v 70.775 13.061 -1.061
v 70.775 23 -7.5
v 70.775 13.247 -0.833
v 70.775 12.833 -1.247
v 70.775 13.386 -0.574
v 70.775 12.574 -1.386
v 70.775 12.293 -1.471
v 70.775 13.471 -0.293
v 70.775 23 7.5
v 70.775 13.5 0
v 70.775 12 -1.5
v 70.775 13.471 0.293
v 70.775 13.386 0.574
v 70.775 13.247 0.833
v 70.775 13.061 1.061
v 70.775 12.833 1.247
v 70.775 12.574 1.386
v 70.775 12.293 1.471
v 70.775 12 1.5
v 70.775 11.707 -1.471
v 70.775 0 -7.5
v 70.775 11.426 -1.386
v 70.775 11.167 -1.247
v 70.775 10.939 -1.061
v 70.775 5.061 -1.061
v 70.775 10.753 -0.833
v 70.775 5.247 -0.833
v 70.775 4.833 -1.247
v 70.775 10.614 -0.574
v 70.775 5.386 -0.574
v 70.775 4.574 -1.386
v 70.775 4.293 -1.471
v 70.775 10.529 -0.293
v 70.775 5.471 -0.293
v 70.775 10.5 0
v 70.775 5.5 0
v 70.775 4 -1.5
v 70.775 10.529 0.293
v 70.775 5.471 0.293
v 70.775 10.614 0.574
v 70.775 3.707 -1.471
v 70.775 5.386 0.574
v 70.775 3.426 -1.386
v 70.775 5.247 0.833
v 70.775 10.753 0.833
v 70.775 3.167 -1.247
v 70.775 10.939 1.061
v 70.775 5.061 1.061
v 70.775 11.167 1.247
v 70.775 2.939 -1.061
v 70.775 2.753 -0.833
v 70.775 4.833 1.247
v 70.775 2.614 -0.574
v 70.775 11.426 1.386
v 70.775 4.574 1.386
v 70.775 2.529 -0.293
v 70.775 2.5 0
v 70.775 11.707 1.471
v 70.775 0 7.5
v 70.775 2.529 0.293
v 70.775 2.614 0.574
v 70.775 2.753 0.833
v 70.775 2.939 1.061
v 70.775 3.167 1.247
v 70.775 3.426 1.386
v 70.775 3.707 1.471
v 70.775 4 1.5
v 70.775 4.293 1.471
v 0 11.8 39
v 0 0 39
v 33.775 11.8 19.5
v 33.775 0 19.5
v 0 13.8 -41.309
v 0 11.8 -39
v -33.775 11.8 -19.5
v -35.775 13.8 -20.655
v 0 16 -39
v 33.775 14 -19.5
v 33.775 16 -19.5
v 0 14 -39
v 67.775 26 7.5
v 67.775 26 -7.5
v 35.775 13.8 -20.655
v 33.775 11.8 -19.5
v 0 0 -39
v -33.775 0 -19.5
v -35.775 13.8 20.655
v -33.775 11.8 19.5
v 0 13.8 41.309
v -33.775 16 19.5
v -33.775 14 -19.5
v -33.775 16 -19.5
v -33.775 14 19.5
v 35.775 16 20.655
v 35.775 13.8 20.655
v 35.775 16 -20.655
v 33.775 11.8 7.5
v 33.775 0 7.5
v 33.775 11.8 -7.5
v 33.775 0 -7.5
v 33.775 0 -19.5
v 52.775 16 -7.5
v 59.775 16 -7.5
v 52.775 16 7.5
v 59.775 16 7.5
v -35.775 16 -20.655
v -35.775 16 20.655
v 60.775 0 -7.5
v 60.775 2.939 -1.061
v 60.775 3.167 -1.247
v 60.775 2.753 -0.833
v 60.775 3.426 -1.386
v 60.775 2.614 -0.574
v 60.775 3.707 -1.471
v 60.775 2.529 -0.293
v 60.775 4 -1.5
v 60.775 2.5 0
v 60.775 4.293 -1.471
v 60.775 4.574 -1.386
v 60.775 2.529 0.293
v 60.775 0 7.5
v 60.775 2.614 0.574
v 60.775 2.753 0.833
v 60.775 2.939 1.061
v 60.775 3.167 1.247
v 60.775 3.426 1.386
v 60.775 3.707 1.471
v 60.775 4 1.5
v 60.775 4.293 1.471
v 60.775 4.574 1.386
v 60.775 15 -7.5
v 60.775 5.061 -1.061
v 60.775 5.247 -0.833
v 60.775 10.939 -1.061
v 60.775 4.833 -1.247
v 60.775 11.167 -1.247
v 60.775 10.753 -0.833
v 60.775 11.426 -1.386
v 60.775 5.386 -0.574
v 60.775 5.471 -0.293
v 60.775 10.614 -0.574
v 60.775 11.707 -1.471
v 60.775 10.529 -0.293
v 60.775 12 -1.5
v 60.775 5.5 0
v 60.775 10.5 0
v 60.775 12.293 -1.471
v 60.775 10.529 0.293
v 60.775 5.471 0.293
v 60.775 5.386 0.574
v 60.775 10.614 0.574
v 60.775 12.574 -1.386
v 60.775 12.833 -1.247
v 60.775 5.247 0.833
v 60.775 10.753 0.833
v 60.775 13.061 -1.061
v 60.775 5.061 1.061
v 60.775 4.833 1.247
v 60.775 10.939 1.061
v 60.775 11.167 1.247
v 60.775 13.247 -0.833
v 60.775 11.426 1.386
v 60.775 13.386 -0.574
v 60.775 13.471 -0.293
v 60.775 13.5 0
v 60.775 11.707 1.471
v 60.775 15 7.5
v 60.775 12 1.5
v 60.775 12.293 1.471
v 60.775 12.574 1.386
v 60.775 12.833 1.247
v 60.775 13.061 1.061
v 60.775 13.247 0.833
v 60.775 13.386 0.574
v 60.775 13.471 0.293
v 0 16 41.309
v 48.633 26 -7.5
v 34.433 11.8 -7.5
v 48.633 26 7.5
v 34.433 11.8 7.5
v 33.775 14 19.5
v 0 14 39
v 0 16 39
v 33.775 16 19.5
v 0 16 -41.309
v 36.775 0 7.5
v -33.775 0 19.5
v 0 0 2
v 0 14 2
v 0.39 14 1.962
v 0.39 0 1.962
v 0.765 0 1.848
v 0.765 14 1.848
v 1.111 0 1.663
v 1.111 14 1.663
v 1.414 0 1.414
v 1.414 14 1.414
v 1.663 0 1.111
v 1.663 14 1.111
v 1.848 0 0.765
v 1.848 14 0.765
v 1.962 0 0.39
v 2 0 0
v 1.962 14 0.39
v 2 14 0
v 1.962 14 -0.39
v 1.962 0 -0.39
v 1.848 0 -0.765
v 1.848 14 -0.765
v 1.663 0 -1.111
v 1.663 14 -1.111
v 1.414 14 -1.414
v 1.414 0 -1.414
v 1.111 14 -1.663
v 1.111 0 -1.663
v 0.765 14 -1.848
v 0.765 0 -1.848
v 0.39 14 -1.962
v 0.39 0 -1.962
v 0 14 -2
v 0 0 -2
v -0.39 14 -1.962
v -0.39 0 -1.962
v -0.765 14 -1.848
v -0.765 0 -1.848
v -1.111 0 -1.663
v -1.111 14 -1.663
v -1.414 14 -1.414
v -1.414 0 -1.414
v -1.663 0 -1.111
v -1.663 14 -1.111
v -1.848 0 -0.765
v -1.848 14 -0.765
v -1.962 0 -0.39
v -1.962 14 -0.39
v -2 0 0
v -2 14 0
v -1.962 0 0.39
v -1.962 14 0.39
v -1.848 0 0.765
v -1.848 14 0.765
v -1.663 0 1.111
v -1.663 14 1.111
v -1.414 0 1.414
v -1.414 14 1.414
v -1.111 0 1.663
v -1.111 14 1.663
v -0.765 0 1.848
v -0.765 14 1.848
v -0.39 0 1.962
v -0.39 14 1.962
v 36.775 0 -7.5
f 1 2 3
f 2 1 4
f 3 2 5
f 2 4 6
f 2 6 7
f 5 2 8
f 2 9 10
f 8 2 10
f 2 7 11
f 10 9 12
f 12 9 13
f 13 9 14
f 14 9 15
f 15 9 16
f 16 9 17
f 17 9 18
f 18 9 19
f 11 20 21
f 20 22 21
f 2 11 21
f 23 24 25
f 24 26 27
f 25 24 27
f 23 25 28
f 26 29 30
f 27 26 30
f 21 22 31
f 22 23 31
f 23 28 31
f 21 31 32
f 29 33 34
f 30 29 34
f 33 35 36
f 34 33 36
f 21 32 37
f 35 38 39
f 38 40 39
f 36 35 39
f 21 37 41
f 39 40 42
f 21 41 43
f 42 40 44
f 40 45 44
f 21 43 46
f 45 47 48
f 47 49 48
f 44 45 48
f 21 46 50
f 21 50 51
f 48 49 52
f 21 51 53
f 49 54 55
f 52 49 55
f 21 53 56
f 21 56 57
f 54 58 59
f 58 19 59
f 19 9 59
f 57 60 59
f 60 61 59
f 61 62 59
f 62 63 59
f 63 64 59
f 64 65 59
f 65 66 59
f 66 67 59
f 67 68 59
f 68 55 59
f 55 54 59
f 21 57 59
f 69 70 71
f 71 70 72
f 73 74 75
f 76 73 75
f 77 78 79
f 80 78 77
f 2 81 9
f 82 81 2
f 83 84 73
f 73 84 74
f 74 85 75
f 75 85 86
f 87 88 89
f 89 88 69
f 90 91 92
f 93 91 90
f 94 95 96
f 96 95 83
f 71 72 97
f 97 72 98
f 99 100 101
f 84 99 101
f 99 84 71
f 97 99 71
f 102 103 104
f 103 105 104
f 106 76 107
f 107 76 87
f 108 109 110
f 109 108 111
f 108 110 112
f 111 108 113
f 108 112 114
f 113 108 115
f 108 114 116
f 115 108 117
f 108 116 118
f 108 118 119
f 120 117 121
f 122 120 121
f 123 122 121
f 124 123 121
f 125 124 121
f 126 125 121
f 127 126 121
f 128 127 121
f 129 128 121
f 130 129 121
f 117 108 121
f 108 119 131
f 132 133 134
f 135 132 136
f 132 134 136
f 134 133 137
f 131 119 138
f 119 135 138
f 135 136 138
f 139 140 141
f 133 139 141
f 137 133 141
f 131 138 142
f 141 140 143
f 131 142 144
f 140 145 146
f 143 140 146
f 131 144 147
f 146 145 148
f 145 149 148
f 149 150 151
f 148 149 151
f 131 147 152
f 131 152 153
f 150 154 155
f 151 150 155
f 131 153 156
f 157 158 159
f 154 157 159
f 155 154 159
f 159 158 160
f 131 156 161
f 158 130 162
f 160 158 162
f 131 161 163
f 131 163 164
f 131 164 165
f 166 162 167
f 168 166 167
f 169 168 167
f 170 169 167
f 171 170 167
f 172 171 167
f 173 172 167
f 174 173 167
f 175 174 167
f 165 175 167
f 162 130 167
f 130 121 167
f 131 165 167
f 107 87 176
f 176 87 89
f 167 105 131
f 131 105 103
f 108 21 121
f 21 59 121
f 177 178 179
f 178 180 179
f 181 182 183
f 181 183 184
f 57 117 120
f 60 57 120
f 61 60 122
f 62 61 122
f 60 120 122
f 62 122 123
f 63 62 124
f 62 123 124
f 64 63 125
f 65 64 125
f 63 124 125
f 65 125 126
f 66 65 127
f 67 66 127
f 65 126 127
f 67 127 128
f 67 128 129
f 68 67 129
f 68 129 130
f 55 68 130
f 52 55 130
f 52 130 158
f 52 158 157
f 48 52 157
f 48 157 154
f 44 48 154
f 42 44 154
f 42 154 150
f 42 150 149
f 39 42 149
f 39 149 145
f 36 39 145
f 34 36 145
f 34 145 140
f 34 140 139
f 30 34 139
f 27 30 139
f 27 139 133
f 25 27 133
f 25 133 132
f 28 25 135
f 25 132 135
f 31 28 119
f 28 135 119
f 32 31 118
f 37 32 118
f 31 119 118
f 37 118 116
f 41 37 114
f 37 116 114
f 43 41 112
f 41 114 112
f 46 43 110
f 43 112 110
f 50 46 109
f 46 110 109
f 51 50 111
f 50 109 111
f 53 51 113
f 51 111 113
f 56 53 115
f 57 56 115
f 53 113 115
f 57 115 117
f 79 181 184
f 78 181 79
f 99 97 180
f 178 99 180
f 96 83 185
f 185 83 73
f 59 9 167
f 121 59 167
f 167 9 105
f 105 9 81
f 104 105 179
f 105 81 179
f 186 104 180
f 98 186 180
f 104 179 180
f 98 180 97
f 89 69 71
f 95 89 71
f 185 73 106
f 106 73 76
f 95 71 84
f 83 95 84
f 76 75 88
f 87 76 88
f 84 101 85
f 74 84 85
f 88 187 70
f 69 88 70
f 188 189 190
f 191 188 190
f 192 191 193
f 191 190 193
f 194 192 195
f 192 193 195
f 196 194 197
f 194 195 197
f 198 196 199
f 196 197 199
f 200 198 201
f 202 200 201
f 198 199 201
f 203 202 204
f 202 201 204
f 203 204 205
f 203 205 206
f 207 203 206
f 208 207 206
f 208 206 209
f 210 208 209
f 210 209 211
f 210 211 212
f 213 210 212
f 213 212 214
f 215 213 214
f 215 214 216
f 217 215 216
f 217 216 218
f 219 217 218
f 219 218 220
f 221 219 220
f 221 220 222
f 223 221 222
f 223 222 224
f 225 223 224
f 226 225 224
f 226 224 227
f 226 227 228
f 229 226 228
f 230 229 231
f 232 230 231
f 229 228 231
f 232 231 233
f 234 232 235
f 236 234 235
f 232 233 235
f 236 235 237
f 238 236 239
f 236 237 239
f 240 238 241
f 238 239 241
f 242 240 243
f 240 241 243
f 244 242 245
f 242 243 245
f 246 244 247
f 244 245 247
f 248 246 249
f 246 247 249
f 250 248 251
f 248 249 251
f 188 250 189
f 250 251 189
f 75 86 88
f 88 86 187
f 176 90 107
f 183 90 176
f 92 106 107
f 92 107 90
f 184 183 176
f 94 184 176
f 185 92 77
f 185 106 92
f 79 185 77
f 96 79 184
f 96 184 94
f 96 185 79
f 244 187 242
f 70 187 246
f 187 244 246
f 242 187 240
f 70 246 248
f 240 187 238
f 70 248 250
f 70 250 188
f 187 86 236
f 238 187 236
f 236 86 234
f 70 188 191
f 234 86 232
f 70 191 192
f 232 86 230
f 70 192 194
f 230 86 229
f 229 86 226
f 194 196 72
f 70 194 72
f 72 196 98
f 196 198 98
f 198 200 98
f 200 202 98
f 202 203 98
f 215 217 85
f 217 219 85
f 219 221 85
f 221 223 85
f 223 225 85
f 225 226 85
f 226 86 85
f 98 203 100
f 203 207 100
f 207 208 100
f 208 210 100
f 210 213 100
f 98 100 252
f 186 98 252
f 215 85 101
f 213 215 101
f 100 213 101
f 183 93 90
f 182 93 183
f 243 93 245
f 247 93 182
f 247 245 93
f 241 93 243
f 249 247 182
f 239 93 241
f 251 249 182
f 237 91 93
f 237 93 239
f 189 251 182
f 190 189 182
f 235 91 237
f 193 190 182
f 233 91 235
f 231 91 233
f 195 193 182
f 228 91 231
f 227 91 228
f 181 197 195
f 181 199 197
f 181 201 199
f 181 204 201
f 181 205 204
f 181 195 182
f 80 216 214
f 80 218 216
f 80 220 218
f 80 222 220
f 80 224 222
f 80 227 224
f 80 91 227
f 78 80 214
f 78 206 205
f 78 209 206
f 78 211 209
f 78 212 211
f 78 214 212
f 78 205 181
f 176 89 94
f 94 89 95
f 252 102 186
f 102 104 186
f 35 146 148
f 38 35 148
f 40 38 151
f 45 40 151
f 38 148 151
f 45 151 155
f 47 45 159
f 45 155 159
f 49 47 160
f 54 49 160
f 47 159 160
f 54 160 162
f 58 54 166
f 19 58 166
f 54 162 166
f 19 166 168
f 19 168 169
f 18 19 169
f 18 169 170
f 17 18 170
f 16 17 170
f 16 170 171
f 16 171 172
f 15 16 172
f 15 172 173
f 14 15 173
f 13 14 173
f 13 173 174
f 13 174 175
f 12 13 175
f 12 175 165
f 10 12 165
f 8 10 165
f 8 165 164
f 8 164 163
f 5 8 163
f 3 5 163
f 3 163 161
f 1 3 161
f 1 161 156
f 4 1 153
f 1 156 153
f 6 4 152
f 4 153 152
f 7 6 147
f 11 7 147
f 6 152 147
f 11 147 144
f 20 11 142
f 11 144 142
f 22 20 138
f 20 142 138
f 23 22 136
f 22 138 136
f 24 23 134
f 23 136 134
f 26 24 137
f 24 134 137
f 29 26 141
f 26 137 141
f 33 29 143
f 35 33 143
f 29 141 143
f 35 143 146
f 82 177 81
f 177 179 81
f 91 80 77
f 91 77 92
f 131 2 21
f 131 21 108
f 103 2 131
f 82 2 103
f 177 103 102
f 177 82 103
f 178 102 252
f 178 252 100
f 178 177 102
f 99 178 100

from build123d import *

# Parameters (mm, degrees)
BOSS_EXTRUDE1_DEPTH      = 14
BOSS_EXTRUDE2_DEPTH      = 2
BOSS_EXTRUDE2_DEPTH_BACK = 0.2
CHAMFER1_SIZE            = 2
SKETCH3_R                = 2
CUT_EXTRUDE1_DEPTH       = 57.412025139
BOSS_EXTRUDE3_DEPTH      = 7.5
CUT_EXTRUDE2_REACH       = 110.187
SKETCH6_R                = 1.5
CHAMFER2_SIZE            = 1
CHAMFER3_SIZE            = 3


with BuildPart() as part:
    # Sketch1 → Boss-Extrude1 (new body)
    with BuildSketch(Plane(origin=(0, 0, 0), x_dir=(1, 0, 0), z_dir=(0, 1, 0))):
        Polygon((33.774990748, 19.5), (0, 39), (-33.774990748, 19.5), (-33.774990748, -19.5), (0, -39), (33.774990748, -19.5), align=None)
    extrude(amount=BOSS_EXTRUDE1_DEPTH)

    # Sketch2 → Boss-Extrude2 (add, two sides: drawn at the far end of the back side and taken through both)
    with BuildSketch(Plane(origin=(0, 14, 0), x_dir=(1, 0, 0), z_dir=(0, 1, 0)).offset(-BOSS_EXTRUDE2_DEPTH_BACK)):
        Polygon((0, 41.309401077), (-35.774990748, 20.654700538), (-35.774990748, -20.654700538), (0, -41.309401077), (35.774990748, -20.654700538), (35.774990748, 20.654700538), align=None)
        Polygon((33.774990748, -19.5), (33.774990748, 19.5), (0, 39), (-33.774990748, 19.5), (-33.774990748, -19.5), (0, -39), align=None, mode=Mode.SUBTRACT)
    extrude(amount=BOSS_EXTRUDE2_DEPTH + BOSS_EXTRUDE2_DEPTH_BACK)

    # Chamfer1
    chamfer1_edges = [part.edges().sort_by_distance(p)[0] for p in [
        (-16.887495374, 13.8, 29.25),
        (16.887495374, 13.8, 29.25),
        (33.774990748, 13.8, 0),
        (16.887495374, 13.8, -29.25),
        (-16.887495374, 13.8, -29.25),
        (-33.774990748, 13.8, 0),
    ]]
    chamfer(chamfer1_edges, length=CHAMFER1_SIZE - 0.0001)  # a hair under: the kernel refuses the full size

    # Sketch3 → Cut-Extrude1 (cut, through all)
    with BuildSketch(Plane(origin=(0, 14, 0), x_dir=(1, 0, 0), z_dir=(0, 1, 0))):
        with Locations(Location((0, 0, 0), (0, 0, 270))):
            Circle(SKETCH3_R)
    extrude(amount=-CUT_EXTRUDE1_DEPTH, mode=Mode.SUBTRACT)

    # Sketch5 → Boss-Extrude3 (add, symmetric)
    with BuildSketch(Plane.XY):
        Polygon((33.774990748, 11.8), (34.432855124, 11.8), (48.632855124, 26), (70.774990748, 26), (70.774990748, 0), (60.774990748, 0), (60.774990748, 16), (52.774990748, 16), (36.774990748, 0), (33.774990748, 0), align=None)
    extrude(amount=BOSS_EXTRUDE3_DEPTH, both=True)

    # Sketch6 → Cut-Extrude2 (cut, up to next)
    with BuildSketch(Plane.ZY.offset(-60.774990748), mode=Mode.PRIVATE) as cut_extrude2_sk1:
        with Locations(Location((0, 12, 0), (0, 0, 270))):
            Circle(SKETCH6_R)
    cut_extrude2_tool1 = extrude(cut_extrude2_sk1.sketch, amount=-CUT_EXTRUDE2_REACH, mode=Mode.PRIVATE) & part.part
    # Sketch6 → Cut-Extrude2 (cut, up to next)
    with BuildSketch(Plane.ZY.offset(-60.774990748), mode=Mode.PRIVATE) as cut_extrude2_sk2:
        with Locations(Location((0, 4, 0), (0, 0, 270))):
            Circle(SKETCH6_R)
    cut_extrude2_tool2 = extrude(cut_extrude2_sk2.sketch, amount=-CUT_EXTRUDE2_REACH, mode=Mode.PRIVATE) & part.part
    add(cut_extrude2_tool1.solids().sort_by_distance((60.774991, 12, 0))[0], mode=Mode.SUBTRACT)
    add(cut_extrude2_tool2.solids().sort_by_distance((60.774991, 4, 0))[0], mode=Mode.SUBTRACT)

    # Chamfer2
    chamfer2_edges = [part.edges().sort_by_distance(p)[0] for p in [
        (60.774990748, 16, 0),
    ]]
    chamfer(chamfer2_edges, length=CHAMFER2_SIZE)

    # Chamfer3
    chamfer3_edges = [part.edges().sort_by_distance(p)[0] for p in [
        (70.774990748, 26, 0),
    ]]
    chamfer(chamfer3_edges, length=CHAMFER3_SIZE)


solid = part.part
